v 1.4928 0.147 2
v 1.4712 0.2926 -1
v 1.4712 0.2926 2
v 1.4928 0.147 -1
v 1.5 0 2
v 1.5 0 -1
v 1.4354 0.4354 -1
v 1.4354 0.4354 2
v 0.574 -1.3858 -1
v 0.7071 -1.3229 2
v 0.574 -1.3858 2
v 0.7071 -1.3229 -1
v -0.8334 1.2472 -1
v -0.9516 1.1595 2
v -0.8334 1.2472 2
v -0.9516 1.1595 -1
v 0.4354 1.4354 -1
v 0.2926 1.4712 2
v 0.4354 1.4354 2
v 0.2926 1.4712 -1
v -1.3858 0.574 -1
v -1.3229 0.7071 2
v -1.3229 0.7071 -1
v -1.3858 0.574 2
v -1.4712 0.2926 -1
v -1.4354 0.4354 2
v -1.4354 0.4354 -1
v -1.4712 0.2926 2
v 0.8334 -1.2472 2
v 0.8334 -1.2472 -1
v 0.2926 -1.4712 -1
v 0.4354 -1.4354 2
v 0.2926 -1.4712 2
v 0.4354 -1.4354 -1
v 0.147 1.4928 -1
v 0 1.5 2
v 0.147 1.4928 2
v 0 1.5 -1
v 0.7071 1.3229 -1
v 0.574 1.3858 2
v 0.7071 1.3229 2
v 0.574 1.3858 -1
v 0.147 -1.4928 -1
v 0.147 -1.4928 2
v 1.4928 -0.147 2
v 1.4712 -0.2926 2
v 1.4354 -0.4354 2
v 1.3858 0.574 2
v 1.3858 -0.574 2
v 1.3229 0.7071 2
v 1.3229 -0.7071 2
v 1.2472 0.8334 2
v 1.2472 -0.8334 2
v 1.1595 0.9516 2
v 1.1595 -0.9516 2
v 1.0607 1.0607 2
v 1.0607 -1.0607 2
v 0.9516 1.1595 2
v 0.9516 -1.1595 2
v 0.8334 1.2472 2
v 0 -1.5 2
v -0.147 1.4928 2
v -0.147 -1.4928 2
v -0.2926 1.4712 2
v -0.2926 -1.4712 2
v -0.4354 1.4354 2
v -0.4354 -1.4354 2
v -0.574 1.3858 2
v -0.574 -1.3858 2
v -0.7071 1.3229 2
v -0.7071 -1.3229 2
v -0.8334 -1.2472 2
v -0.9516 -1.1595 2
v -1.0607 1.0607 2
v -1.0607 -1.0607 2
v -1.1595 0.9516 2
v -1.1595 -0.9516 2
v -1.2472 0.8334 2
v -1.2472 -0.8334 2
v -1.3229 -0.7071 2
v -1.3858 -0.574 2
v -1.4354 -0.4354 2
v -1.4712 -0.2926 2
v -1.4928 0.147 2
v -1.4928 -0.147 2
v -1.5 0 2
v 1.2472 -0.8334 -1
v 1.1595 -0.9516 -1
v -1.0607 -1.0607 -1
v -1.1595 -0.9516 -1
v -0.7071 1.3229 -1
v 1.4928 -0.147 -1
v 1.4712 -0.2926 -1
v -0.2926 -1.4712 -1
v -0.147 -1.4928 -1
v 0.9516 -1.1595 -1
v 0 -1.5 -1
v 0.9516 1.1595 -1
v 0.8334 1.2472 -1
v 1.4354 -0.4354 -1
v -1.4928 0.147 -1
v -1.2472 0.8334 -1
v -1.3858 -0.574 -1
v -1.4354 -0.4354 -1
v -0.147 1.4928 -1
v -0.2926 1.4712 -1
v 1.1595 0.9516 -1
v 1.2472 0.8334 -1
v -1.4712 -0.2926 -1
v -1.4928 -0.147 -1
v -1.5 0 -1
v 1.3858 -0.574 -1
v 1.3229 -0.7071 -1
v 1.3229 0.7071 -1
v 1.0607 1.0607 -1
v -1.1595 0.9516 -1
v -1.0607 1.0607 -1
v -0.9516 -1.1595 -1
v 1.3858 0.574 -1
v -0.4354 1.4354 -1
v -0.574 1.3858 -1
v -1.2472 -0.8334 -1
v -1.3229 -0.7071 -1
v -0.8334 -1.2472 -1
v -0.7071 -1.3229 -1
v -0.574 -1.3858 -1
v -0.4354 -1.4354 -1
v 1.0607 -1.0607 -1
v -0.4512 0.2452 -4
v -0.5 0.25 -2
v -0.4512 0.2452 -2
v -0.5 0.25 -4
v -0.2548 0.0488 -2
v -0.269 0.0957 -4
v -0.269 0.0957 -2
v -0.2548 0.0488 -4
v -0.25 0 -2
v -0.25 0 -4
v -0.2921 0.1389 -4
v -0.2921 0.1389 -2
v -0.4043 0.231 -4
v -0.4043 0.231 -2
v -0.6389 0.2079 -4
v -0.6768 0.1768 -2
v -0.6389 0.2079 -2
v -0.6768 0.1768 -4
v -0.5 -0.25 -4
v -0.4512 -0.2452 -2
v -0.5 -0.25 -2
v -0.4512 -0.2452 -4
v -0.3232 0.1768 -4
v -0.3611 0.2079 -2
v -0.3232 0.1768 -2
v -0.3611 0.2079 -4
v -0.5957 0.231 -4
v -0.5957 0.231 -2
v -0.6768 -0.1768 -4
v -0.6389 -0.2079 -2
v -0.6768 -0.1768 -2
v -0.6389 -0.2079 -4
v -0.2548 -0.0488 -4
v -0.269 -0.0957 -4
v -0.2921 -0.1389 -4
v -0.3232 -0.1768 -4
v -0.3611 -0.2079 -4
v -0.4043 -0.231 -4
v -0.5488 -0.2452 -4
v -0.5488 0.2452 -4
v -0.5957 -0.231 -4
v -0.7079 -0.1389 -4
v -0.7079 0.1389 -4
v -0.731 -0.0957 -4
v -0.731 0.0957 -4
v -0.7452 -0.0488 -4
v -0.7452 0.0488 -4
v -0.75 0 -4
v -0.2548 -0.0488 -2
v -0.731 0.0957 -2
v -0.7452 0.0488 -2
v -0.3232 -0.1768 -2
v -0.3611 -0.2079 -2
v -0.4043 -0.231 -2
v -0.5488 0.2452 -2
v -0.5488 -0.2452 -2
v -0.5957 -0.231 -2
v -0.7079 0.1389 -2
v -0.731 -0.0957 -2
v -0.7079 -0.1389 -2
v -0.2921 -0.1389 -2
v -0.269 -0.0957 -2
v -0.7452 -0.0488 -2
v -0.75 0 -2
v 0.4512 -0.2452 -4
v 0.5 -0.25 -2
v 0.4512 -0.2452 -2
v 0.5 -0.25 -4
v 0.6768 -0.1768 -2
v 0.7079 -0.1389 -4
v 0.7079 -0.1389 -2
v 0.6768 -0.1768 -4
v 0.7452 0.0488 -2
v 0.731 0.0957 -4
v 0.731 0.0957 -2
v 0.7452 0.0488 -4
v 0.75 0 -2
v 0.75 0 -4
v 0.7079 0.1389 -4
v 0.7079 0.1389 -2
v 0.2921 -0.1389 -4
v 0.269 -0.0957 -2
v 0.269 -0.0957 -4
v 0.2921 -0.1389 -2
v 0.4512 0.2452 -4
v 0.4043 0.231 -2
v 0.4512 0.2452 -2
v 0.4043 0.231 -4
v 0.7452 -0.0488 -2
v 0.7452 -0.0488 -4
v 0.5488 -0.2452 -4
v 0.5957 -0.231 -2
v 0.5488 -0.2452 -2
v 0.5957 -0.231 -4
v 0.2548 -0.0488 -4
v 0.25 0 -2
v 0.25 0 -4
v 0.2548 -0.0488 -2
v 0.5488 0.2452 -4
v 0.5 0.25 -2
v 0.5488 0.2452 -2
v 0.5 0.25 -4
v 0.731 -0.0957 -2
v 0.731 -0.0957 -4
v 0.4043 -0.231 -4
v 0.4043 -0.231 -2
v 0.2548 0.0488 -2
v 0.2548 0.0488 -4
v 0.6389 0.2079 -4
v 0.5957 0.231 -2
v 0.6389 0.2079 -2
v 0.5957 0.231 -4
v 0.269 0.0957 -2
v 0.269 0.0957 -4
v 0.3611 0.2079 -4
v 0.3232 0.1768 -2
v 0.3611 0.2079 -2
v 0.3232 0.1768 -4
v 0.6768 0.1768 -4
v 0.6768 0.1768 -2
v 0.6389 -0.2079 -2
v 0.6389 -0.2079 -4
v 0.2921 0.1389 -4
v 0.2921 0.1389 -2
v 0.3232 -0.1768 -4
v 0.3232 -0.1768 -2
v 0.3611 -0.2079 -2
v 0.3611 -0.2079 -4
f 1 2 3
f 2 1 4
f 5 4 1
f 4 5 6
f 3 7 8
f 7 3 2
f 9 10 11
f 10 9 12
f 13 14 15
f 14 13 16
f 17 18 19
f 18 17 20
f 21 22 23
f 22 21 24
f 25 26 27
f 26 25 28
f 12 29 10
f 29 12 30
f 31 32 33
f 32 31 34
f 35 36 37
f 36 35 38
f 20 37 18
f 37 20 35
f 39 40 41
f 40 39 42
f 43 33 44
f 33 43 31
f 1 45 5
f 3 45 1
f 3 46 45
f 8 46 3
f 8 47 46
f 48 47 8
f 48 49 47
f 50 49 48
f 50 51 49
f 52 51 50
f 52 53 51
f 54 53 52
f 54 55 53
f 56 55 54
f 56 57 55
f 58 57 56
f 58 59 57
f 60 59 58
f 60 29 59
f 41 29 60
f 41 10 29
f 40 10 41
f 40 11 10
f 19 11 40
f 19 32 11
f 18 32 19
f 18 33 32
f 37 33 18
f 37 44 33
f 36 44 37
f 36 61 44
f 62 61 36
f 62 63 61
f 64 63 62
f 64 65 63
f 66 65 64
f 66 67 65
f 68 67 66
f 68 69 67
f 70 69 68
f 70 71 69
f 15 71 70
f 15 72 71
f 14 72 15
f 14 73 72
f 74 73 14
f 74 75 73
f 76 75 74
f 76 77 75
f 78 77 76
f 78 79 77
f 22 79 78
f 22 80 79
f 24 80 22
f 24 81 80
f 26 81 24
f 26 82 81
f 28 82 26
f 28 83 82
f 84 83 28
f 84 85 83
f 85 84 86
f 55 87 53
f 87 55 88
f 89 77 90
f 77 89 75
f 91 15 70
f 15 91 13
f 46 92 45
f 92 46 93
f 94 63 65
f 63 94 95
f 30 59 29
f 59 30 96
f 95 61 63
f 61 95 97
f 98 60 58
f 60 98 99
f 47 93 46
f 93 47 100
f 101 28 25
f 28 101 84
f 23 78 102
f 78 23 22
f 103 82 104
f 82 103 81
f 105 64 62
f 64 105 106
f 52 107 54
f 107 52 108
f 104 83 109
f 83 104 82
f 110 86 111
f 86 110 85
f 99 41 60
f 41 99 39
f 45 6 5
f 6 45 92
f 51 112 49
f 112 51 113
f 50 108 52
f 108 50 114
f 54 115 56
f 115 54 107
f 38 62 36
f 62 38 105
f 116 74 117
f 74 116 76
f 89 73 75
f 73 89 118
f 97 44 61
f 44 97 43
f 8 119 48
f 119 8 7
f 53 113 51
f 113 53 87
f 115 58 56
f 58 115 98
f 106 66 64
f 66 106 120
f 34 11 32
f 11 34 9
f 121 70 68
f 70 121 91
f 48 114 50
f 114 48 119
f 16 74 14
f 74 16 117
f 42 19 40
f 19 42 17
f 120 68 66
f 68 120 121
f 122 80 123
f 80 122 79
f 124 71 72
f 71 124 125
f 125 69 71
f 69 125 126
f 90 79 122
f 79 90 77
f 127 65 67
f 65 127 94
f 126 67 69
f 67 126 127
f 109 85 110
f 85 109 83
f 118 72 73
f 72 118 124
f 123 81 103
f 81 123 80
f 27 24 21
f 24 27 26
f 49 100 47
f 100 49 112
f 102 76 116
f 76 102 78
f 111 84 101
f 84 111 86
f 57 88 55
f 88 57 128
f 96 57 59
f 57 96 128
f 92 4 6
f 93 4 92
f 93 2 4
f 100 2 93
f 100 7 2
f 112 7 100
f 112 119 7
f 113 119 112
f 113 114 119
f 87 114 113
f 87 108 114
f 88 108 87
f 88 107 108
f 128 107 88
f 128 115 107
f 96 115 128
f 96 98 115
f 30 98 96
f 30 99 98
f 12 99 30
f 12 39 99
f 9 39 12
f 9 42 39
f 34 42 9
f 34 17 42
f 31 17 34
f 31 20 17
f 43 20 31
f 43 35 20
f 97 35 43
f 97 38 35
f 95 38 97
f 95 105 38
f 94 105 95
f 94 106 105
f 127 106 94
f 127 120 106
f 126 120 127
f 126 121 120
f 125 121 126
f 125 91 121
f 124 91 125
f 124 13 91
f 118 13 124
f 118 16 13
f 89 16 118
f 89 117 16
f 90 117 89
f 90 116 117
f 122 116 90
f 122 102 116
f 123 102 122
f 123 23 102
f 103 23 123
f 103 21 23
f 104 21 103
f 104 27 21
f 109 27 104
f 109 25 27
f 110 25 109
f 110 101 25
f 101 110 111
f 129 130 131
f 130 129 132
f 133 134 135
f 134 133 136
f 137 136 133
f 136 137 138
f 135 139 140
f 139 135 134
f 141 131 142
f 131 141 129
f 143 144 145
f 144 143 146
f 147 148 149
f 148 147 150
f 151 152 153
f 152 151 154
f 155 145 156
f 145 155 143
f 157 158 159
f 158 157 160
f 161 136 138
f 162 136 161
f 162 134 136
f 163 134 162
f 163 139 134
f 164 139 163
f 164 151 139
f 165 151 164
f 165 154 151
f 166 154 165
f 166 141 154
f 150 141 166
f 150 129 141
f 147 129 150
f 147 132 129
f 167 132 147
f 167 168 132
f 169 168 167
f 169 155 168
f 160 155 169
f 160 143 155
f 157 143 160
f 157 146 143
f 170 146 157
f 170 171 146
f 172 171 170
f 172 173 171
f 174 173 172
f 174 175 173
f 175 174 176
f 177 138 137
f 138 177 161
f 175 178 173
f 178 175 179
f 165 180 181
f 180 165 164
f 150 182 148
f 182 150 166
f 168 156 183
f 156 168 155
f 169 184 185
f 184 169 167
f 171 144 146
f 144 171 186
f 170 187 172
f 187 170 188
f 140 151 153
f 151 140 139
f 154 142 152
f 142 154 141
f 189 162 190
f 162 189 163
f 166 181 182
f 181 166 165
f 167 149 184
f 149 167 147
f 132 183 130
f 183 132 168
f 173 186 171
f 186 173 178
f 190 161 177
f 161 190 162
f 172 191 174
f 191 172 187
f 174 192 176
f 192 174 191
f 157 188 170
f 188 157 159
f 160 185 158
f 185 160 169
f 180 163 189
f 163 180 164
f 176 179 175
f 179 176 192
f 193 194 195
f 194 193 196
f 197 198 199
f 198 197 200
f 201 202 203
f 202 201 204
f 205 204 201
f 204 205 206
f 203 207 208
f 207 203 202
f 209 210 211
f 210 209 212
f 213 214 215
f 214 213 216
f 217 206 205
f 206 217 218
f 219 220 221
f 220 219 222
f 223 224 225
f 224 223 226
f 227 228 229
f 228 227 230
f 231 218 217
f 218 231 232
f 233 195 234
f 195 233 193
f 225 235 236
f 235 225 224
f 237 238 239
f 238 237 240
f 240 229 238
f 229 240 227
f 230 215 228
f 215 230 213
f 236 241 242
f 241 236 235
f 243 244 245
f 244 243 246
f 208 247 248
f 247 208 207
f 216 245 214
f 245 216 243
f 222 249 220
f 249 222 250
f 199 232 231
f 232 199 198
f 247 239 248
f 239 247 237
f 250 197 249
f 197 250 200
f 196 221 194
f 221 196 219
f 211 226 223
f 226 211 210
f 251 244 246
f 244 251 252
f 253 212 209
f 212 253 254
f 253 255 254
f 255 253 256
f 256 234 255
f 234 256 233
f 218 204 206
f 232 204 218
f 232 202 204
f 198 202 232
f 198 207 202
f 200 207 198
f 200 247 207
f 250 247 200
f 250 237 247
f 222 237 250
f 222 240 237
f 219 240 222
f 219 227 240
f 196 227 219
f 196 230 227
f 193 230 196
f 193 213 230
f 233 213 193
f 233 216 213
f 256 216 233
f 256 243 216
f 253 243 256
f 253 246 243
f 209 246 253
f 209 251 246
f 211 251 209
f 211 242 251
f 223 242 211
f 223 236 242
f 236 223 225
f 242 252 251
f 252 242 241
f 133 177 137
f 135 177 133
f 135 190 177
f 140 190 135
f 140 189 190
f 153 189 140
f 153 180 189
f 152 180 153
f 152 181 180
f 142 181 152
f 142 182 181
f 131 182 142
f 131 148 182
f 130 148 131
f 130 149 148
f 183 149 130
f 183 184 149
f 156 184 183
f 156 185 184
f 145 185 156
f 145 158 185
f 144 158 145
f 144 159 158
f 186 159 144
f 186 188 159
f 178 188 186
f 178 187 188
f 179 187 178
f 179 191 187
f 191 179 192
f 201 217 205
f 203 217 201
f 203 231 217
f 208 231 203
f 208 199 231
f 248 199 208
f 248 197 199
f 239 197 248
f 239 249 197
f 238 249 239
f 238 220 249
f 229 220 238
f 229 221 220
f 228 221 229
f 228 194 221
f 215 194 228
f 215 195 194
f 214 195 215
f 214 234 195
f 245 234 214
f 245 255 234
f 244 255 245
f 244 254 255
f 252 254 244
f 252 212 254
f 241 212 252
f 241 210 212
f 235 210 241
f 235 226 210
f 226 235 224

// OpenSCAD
module thermistor() {
    difference() {
        union() {
            // Main body of the thermistor
            translate([0, 0, -1])
                cylinder(h=3, r=1.5, $fn=64);
            // Leads of the thermistor
            translate([-0.5, 0, -4])
                cylinder(h=3, r=0.25, $fn=32);
            translate([0.5, 0, -4])
                cylinder(h=3, r=0.25, $fn=32);
        }
        // Flatten the bottom of the main body
        translate([0, 0, -1.5])
            cube([3, 3, 1], center=true);
    }
}

thermistor();
